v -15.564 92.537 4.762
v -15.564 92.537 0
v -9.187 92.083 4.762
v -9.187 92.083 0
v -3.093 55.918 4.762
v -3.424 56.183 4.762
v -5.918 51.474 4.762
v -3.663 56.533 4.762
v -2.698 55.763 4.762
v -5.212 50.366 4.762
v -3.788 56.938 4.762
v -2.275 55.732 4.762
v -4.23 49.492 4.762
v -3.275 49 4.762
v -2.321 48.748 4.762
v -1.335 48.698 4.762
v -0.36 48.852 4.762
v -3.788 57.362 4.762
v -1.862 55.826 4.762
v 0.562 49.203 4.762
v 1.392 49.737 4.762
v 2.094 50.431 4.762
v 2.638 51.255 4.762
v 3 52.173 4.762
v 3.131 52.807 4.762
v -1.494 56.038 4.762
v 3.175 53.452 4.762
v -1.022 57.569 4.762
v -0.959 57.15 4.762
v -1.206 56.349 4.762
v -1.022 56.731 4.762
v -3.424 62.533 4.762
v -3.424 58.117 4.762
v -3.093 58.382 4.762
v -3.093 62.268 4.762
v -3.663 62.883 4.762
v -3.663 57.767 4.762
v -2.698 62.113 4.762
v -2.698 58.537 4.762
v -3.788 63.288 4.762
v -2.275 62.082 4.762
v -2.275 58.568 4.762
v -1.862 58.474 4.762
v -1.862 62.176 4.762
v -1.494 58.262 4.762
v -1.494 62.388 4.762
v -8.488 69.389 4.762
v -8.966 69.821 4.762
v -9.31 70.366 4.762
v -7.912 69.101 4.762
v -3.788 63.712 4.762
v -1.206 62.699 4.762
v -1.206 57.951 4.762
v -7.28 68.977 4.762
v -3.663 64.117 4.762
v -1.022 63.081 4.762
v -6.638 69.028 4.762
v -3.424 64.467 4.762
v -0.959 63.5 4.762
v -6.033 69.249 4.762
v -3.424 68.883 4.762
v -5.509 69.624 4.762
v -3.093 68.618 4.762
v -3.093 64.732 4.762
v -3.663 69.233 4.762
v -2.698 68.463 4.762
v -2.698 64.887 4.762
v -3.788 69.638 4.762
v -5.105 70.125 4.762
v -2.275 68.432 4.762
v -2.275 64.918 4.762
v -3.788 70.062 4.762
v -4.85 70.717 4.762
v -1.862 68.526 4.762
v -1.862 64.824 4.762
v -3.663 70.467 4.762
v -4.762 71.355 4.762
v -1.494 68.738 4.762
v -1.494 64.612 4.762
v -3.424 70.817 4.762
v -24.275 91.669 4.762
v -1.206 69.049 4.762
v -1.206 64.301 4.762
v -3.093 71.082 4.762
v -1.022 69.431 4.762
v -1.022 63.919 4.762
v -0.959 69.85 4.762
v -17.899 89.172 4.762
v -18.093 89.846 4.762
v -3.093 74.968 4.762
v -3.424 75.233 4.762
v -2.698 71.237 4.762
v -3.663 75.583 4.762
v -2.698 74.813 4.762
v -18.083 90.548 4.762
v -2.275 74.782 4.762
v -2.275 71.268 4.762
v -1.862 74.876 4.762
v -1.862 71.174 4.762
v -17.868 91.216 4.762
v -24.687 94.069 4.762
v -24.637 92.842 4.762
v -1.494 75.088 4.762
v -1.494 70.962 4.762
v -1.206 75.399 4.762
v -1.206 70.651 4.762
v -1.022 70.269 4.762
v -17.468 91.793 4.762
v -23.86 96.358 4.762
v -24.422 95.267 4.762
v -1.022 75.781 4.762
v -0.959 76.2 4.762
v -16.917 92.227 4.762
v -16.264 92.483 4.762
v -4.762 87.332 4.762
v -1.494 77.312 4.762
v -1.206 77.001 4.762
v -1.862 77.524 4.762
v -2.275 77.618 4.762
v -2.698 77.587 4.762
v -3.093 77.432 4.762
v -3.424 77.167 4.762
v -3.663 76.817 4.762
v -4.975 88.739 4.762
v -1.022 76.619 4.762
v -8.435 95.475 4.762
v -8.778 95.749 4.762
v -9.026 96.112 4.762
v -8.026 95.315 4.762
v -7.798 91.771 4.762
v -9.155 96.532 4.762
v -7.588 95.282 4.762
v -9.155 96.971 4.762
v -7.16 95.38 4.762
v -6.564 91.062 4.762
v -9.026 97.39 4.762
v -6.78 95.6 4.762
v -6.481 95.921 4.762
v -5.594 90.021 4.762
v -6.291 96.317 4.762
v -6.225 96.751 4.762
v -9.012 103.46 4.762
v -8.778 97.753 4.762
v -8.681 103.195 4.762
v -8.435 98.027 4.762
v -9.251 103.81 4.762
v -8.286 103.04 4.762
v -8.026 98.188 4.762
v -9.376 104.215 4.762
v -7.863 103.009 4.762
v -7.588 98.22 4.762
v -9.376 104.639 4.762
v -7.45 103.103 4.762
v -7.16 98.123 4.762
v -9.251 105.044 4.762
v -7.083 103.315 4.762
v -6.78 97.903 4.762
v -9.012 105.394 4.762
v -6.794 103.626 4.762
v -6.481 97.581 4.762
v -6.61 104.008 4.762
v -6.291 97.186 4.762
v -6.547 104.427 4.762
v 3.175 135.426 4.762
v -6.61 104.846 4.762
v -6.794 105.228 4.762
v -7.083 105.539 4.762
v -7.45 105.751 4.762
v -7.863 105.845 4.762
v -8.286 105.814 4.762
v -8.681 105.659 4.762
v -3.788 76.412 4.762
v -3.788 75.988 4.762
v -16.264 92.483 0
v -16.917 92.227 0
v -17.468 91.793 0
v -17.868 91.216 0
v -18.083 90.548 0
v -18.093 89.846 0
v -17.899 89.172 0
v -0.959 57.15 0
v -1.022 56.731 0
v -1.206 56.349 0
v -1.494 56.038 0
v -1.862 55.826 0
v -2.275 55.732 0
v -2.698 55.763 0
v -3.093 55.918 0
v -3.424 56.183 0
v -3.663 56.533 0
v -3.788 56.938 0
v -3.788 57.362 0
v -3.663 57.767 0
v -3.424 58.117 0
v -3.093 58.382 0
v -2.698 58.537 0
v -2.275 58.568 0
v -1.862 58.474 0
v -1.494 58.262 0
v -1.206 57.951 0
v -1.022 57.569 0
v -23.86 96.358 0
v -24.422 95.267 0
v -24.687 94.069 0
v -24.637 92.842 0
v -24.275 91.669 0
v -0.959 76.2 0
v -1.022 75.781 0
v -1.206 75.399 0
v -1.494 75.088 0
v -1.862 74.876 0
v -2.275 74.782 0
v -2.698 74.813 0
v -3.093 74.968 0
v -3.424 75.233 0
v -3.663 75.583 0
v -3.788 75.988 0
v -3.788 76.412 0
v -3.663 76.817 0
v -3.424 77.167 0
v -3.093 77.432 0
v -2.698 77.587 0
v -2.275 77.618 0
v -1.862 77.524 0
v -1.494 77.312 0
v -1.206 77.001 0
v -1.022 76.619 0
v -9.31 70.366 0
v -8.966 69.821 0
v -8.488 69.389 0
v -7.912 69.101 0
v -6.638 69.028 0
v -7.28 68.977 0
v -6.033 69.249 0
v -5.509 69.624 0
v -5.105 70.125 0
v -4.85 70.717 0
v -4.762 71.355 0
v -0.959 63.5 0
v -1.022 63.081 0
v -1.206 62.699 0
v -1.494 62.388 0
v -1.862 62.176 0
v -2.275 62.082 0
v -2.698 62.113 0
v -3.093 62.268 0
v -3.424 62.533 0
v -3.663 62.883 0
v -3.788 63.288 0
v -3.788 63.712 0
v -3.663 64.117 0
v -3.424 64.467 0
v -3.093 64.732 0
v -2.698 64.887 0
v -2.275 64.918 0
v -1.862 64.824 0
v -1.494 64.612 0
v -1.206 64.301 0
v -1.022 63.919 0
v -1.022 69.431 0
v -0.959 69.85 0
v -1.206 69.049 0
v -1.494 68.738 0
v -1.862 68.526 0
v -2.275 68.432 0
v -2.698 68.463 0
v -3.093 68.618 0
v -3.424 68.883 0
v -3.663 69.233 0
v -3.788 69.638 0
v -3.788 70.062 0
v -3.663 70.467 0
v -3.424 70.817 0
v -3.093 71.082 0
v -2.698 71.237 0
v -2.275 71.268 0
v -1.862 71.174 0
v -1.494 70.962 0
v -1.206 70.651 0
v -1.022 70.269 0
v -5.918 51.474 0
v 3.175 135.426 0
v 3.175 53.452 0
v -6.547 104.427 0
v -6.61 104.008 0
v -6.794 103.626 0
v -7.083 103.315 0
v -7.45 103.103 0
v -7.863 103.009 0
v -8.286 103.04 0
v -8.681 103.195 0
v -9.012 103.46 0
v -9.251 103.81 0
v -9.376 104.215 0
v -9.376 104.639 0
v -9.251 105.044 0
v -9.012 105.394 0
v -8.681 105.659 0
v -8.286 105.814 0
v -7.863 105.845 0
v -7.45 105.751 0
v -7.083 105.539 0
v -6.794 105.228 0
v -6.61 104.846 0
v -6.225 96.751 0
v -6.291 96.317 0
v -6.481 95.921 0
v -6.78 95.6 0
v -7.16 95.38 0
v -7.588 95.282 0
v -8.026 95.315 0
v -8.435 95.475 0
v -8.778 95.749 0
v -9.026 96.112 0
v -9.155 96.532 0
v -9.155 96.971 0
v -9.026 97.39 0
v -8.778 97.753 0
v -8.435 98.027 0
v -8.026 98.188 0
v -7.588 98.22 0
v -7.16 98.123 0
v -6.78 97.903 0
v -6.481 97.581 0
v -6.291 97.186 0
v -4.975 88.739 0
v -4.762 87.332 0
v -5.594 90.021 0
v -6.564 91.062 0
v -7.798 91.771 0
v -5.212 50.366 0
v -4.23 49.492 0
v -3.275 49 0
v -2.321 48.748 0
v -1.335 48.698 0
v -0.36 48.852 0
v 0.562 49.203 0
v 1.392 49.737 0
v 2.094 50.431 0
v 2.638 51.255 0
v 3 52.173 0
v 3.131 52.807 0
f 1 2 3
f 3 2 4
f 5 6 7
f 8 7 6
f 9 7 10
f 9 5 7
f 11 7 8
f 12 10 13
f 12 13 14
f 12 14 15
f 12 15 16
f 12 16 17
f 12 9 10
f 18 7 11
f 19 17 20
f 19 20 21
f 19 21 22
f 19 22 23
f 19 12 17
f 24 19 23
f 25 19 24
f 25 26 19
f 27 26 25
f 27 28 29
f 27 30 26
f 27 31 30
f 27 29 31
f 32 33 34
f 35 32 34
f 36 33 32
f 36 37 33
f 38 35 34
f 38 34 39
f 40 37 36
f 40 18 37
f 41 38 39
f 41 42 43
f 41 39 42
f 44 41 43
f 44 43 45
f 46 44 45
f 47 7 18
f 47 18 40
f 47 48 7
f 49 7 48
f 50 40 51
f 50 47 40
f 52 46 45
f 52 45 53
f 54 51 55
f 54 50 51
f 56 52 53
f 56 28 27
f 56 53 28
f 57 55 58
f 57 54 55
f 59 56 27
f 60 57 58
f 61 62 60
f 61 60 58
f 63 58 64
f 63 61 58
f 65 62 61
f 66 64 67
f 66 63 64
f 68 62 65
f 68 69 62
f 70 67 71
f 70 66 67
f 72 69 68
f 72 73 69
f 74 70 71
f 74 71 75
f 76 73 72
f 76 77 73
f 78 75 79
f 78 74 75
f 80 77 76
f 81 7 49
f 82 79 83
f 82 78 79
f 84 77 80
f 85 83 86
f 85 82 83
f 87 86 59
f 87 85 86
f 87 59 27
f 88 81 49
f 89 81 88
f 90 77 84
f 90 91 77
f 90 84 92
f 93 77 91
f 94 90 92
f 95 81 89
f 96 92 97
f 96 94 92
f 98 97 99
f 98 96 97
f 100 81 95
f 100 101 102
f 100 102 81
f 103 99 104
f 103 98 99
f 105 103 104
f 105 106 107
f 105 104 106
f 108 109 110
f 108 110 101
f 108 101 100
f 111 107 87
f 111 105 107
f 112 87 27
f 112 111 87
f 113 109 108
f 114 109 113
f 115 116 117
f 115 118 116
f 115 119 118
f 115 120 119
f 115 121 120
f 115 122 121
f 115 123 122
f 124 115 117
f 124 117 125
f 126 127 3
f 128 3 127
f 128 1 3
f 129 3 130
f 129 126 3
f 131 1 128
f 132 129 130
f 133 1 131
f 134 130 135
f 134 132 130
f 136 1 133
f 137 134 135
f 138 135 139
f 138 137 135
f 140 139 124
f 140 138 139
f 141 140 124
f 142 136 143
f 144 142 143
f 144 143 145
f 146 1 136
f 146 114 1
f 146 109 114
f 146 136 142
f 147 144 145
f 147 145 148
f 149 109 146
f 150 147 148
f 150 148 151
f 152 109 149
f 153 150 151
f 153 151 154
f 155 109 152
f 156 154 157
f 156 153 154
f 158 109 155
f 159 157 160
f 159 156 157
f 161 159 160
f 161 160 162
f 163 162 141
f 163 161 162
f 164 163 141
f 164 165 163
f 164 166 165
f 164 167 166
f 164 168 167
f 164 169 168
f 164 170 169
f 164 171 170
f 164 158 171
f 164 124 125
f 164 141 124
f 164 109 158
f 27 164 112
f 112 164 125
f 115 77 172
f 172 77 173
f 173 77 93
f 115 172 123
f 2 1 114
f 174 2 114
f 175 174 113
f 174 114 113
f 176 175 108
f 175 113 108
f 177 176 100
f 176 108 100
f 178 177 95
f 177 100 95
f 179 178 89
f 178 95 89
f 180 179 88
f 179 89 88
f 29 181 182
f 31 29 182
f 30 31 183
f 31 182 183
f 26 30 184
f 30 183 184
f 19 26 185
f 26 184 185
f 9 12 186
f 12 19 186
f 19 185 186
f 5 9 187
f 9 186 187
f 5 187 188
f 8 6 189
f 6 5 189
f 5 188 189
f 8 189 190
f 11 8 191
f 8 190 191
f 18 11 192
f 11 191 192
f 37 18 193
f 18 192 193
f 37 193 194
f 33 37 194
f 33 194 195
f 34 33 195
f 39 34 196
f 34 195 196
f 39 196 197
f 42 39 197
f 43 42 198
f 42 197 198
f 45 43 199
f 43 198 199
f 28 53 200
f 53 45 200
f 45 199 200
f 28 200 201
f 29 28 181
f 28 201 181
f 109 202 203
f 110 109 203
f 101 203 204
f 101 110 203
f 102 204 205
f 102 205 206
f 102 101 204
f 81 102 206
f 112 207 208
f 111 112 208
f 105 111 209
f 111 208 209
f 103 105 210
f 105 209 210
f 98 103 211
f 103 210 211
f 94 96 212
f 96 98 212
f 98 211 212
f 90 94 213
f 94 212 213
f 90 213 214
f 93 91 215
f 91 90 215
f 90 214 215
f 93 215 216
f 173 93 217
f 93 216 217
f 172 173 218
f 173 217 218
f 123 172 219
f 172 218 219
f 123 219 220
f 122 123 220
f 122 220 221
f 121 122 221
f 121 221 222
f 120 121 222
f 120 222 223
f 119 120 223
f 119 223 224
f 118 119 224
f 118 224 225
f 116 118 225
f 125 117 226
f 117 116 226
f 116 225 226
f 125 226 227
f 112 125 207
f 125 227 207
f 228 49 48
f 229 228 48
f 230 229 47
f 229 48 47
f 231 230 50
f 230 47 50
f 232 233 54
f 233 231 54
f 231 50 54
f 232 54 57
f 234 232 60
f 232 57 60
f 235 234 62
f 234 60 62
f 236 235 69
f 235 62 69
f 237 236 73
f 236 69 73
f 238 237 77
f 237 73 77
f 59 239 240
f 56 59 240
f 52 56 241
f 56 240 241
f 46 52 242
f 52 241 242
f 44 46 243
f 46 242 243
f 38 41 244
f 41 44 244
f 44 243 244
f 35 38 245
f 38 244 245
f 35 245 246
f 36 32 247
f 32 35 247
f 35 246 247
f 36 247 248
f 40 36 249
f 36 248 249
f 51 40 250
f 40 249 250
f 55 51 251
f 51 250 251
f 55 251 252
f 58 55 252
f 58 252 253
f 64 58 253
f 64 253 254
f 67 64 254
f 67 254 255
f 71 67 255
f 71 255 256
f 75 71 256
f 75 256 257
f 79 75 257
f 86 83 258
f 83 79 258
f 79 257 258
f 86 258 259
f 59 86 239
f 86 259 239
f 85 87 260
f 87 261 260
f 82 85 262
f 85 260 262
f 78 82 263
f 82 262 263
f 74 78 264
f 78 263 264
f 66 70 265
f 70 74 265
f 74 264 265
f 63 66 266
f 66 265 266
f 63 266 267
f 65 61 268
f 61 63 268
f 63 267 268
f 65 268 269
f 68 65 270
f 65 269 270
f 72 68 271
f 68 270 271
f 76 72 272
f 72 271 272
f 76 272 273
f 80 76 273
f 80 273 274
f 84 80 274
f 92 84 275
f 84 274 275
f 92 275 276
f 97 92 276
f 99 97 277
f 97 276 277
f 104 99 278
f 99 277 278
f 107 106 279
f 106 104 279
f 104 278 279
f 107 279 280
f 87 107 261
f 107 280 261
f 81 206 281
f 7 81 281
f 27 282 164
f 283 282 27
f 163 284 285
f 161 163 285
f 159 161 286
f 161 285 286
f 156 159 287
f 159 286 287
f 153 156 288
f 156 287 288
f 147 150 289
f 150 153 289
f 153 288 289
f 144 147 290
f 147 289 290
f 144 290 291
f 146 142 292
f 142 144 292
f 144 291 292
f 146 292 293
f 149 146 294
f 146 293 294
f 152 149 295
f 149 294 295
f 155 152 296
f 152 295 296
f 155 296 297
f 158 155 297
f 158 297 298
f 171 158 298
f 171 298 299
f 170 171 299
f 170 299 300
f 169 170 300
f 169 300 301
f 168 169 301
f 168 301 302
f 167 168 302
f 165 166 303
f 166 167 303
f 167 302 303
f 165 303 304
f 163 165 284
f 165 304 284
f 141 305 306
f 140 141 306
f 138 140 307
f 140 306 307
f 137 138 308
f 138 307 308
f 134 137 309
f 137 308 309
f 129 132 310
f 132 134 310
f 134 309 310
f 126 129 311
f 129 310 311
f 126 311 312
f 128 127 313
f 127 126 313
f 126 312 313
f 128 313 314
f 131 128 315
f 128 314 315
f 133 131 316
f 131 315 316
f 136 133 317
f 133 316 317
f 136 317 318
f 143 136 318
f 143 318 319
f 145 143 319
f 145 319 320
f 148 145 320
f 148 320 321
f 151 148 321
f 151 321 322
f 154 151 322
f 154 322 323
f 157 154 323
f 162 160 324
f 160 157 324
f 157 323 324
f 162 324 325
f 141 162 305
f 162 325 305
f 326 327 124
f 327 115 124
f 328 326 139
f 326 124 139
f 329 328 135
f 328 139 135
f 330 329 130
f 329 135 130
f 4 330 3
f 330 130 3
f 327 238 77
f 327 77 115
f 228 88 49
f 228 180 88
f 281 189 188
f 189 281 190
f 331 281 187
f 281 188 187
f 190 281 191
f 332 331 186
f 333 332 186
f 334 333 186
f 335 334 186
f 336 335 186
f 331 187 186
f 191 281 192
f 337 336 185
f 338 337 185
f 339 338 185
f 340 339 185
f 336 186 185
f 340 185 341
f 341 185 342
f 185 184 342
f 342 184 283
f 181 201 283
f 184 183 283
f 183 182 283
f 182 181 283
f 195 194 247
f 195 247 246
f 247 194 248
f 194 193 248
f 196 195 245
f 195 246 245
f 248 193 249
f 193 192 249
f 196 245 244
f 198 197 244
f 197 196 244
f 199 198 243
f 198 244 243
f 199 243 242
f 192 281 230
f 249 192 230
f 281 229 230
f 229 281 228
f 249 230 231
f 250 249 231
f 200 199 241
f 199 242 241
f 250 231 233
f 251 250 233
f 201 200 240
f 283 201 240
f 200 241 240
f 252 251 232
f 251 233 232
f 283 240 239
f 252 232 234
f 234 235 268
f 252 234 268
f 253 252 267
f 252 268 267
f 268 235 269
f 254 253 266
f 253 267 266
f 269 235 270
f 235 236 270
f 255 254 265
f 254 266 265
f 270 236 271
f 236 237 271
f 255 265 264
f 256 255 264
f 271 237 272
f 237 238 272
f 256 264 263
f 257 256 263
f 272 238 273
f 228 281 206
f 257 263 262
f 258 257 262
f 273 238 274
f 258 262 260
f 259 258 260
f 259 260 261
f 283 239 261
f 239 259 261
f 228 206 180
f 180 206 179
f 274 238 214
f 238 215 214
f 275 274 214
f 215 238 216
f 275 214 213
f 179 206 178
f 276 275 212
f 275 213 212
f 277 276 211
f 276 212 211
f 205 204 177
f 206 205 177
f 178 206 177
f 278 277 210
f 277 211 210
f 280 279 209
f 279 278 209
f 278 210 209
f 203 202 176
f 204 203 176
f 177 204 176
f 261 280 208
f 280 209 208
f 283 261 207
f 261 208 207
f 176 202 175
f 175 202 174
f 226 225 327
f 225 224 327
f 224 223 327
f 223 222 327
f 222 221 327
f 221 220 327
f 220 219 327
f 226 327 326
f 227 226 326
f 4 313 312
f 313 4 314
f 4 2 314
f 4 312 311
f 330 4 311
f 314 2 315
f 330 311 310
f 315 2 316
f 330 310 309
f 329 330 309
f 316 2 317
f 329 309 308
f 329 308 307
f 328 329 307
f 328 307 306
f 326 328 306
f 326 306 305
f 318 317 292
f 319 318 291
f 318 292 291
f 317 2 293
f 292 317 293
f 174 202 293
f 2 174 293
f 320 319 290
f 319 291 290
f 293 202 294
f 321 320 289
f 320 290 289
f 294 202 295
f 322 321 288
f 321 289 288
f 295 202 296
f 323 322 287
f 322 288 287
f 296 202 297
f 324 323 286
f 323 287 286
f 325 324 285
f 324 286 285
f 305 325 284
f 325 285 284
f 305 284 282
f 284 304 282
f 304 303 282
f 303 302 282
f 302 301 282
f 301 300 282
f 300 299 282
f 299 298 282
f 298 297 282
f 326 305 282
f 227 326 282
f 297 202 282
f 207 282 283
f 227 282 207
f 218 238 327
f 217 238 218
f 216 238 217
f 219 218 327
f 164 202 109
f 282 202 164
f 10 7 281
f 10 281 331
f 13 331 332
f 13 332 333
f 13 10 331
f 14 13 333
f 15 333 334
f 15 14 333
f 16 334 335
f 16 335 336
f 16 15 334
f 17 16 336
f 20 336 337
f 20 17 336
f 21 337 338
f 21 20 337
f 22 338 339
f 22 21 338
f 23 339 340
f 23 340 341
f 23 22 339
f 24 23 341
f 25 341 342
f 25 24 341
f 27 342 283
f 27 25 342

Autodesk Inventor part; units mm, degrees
ref_plane "YZ Plane" through (0, 0, 0) normal (1, 0, 0) x (0, 1, 0)
ref_plane "XZ Plane" through (0, 0, 0) normal (0, 1, 0) x (-1, 0, 0)
ref_plane "XY Plane" through (0, 0, 0) normal (0, 0, 1) x (1, 0, 0)
sketch "Sketch1" plane through (0, 0, 0) normal (0, 0, 1) x (1, 0, 0)
  line L0 (0, 0) -> (0, 137.0131)
  line L1 (-11.7886, 12.2907) -> (-39.6863, 18.4755) construction
  line L2 (-39.6863, 18.4755) -> (-33.3297, 47.1481) construction
  line L3 (-33.3297, 47.1481) -> (-5.432, 40.9633) construction
  line L4 (-5.432, 40.9633) -> (-11.7886, 12.2907) construction
  line L5 (-39.6863, 18.4755) -> (-5.432, 40.9633) construction
  line L6 (-33.3297, 47.1481) -> (-11.7886, 12.2907) construction
  circle A0 centre (-53.975, 12.7) radius 3.175
  circle A1 centre (-53.975, 12.7) radius 9.525
  line L7 (0, 0) -> (-54.5315, 3.1913) construction
  line L8 (-62.4238, 17.0982) -> (0, 137.0131) construction
  line L9 (-27.1302, 45.7737) -> (-37.4529, 28.5497) construction
  line L10 (-11.6315, 42.3377) -> (-9.5552, 22.3649) construction
  line L11 (-19.3809, 44.0557) -> (-25.7374, 15.3831) construction
  line L12 (0, 104.775) -> (-15.0457, 108.1106) construction
  line L13 (-35.3766, 8.5768) -> (-19.8779, 5.1408) construction
  line L14 (-19.8779, 5.1408) -> (-21.2523, -1.0586) construction
  line L15 (-21.2523, -1.0586) -> (-36.751, 2.3773) construction
  line L16 (-36.751, 2.3773) -> (-35.3766, 8.5768) construction
  line L17 (-35.3766, 8.5768) -> (-44.7305, 2.6177) construction
  line L18 (-19.8779, 5.1408) -> (-17.2457, 1.0092) construction
  line L19 (-5.432, 40.9633) -> (-33.3297, 47.1481) construction
  line L20 (-33.3297, 47.1481) -> (-32.2475, 52.0296) construction
  line L21 (-32.2475, 52.0296) -> (-4.3498, 45.8448) construction
  line L22 (-4.3498, 45.8448) -> (-5.432, 40.9633) construction
  line L23 (-53.2878, 15.7997) -> (-53.975, 12.7) construction
  line L24 (-53.975, 12.7) -> (-57.0747, 13.3872) construction
  line L25 (-27.6272, 6.8588) -> (-34.4992, -24.1386) construction
  line L26 (-31.8676, 50.076) -> (-5.5198, 44.2349) construction
  line L27 (-5.5198, 44.2349) -> (-4.489, 48.8845) construction
  line L28 (-4.489, 48.8845) -> (-30.8368, 54.7256) construction
  line L29 (-30.8368, 54.7256) -> (-31.8676, 50.076) construction
  line L30 (-31.3522, 52.4008) -> (-5.0044, 46.5597) construction
  circle A2 centre (-29.0274, 51.8854) radius 1.4732 construction
  circle A3 centre (-22.8279, 50.5111) radius 1.4732 construction
  circle A4 centre (-16.6284, 49.1367) radius 1.4732
  circle A5 centre (-10.4289, 47.7623) radius 1.4732
  circle A6 centre (-7.6985, 96.7513) radius 1.4732
  line L31 (-53.975, 12.7) -> (-5.4185, 105.9762) construction
  line L32 (-31.2085, 56.4341) -> (0, 49.5153) construction
  circle A7 centre (-7.6985, 96.7513) radius 4.7625 construction
  line L33 (-4.7625, 48.9451) -> (-4.7625, 105.8308)
  line L34 (-26.3948, 55.3669) -> (-7.323, 92.0036) construction
  line L35 (-3.5958, 94.3328) -> (-4.7625, 94.5914) construction
  line L36 (-17.2457, 1.0092) -> (0, 1.0092) construction
  line L37 (0, 1.0092) -> (0, -2.1658) construction
  line L38 (0, -2.1658) -> (-17.2457, -2.1658) construction
  line L39 (-17.2457, -2.1658) -> (-17.2457, 1.0092) construction
  circle A8 centre (-12.7, 7.9375) radius 1.5875 construction
  line L40 (-12.7, 7.9375) -> (0, 7.9375) construction
  line L41 (0, 7.9375) -> (-17.2457, 1.0092)
  circle A9 centre (-12.7, 7.9375) radius 3.175 construction
  line L42 (-9.525, 7.9375) -> (-9.525, 4.111) construction
  line L43 (-9.525, 7.9375) -> (0, 7.9375) construction
  line L44 (-17.9187, 46.9837) -> (-16.8879, 51.6333) construction
  line L45 (-12.4942, 45.7811) -> (-26.2381, -16.2137) construction
  line L46 (0, 53.6985) -> (0, 7.9375) construction
  line L47 (-26.2381, -16.2137) -> (-20.0386, -17.5881) construction
  line L48 (-20.0386, -17.5881) -> (-8.7313, 7.9375)
  circle A10 centre (-12.7, 6.35) radius 1.4224
  line L49 (0, 13.4938) -> (-4.7625, 13.4938) construction
  line L50 (-4.7625, 13.4938) -> (-4.7625, 24.6063) construction
  line L51 (-4.7625, 24.6063) -> (0, 24.6063) construction
  line L52 (0, 24.6063) -> (0, 13.4938) construction
  line L53 (-4.7625, 19.05) -> (0, 19.05) construction
  circle A11 centre (-2.3813, 19.05) radius 1.4224
  line L54 (-20.7405, 8.5842) -> (-9.7454, 58.18) construction
  line L55 (-9.7454, 58.18) -> (-3.5459, 56.8056) construction
  line L56 (-3.5459, 56.8056) -> (-14.5411, 7.2098) construction
  line L57 (-14.5411, 7.2098) -> (-20.7405, 8.5842) construction
  line L58 (-12.7, 6.35) -> (-12.7, 7.9375) construction
  line L59 (-11.5442, 1.5875) -> (-9.525, 1.5875) construction
  line L60 (-9.525, 1.5875) -> (-9.525, 7.9375) construction
  line L61 (-9.525, 7.9375) -> (-11.5442, 7.9375) construction
  line L62 (-11.5442, 7.9375) -> (-11.5442, 1.5875) construction
  line L63 (-9.7454, 58.18) -> (-15.9449, 59.5544) construction
  line L64 (-18.8691, 53.6985) -> (0, 53.6985) construction
  line L65 (-9.7454, 58.18) -> (-17.3193, 53.3549) construction
  arc A12 (-10.2313, 55.9882) -> (-11.9373, 58.6659) centre (-11.0843, 57.3271) ccw construction
  line L66 (-4.7625, 57.15) -> (0, 57.15) construction
  circle A13 centre (-2.3813, 57.15) radius 1.4224
  circle A14 centre (-2.3813, 63.5) radius 1.4224
  line L67 (0, 7.9375) -> (-45.2378, 7.9375) construction
  line L68 (-45.2378, 7.9375) -> (-45.2378, -28.575) construction
  line L69 (-45.2378, -28.575) -> (0, -28.575)
  line L70 (0, -28.575) -> (0, 7.9375)
  line L71 (-45.2378, -28.575) -> (-62.6076, 8.6746)
  line L72 (-60.0032, 20.0747) -> (-18.8691, 53.6985) construction
  line L73 (-20.0386, -17.5881) -> (-20.0386, -28.575) construction
  line L74 (-20.2435, 47.4991) -> (-19.2127, 52.1487) construction
  line L75 (-12.7, -28.575) -> (-12.7, -1.0217)
  circle A15 centre (-23.8125, -19.05) radius 1.7526
  circle A16 centre (-15.875, -14.2875) radius 1.7526
  circle A17 centre (-23.8125, -19.05) radius 3.175 construction
  circle A18 centre (-2.3813, 69.85) radius 1.4224
  circle A19 centre (-2.3813, 76.2) radius 1.4224
  circle A20 centre (-15.875, -14.2875) radius 3.175 construction
  circle A21 centre (-46.0375, -19.05) radius 1.7526
  arc A22 (0, 104.775) -> (-15.0457, 108.1106) centre (-7.9697, 104.427) ccw construction
  circle A23 centre (-7.9697, 104.427) radius 1.4224
  line L76 (-7.9697, 104.427) -> (-15.0457, 108.1106) construction
  line L77 (-7.9697, 104.427) -> (0, 104.775) construction
  line L78 (0, 43.0112) -> (-20.2435, 47.4991)
  line L79 (-20.2435, 47.4991) -> (-25.4, 94.1319)
  line L80 (-25.4, 94.1319) -> (3.175, 135.4256)
  line L81 (0, 122.468) -> (-20.4707, 92.8859)
  line L82 (-20.4707, 92.8859) -> (-15.8846, 51.4108)
  line L83 (-15.8846, 51.4108) -> (0, 47.8893)
  line L84 (-20.4707, 92.8859) -> (-4.7625, 91.7678)
  line L85 (3.175, 135.4256) -> (3.175, 47.8893)
  line L86 (3.175, 47.8893) -> (0, 47.8893)
  line L87 (-25.4, 94.1319) -> (-4.7625, 48.9451)
  line L88 (-19.9433, 93.648) -> (-4.7625, 60.4089)
  point P0 (-22.5591, 29.7194)
  point P1 (-20.7484, 1.2142)
  point P2 (-36.3367, 4.2458)
  point P3 (-49.5768, 21.1488)
  point P4 (-11.1125, 7.9375)
  point P5 (-11.4283, 6.9872)
  point P6 (-11.9574, 7.9375)
  point P7 (-13.9717, 6.9872)
  point P8 (-9.525, 6.1457)
  point P9 (-10.6215, 3.6705)
  point P10 (0, 130.8374)
  point P11 (-19.5658, 92.8214)
  dimension "d74" = 6.35
  dimension "d14" = 29.3687
  dimension "d15" = 28.575
  dimension "d16" = 12.5
  dimension "d17" = 6.35
  dimension "d19" = 53.975
  dimension "d22" = 19.05
  dimension "d23" = 7.9375
  dimension "d24" = 19.05
  dimension "d26" = 102.5
  dimension "d29" = 6.35
  dimension "d31" = 7.9375
  dimension "d34" = 5
  dimension "d35" = 26.9875
  dimension "d38" = 31.75
  dimension "d40" = 26.9875
  dimension "d41" = 4.7625
  dimension "d42" = 2.9464
  dimension "d43" = 2.3813
  dimension "d46" = 6.35
  dimension "d51" = 2.9464
  dimension "d52" = 92.075
  dimension "d53" = 6.35
  dimension "d54" = 9.525
  dimension "d55" = 4.7625
  dimension "d56" = 4.7625
  dimension "d60" = 12.7
  dimension "d61" = 3.175
  dimension "d63" = 3.175
  dimension "d66" = 3.175
  dimension "d67" = 12.7
  dimension "d72" = 8.7312
  dimension "d73" = 7.9375
  dimension "d80" = 12.7
  dimension "d82" = 7.9375
  dimension "d83" = 63.5
  dimension "d85" = 6.35
  dimension "d86" = 104.775
  dimension "d87" = 2.8448
  dimension "d88" = 4.7625
  dimension "d89" = 11.1125
  dimension "d90" = 2.8448
  dimension "d91" = 19.05
  dimension "d92" = 6.35
  dimension "d93" = 50.8
  dimension "d94" = 25.4
  dimension "d95" = 8.7312
  dimension "d96" = 9.525
  dimension "d97" = 6.35
  dimension "d99" = 6.35
  dimension "d101" = 3.175
  dimension "d106" = 2.8448
  dimension "d107" = 57.15
  dimension "d110" = 6.35
  dimension "d136" = 3.175
  dimension "d138" = 28.575
  dimension "d139" = 12.7
  dimension "d140" = 3.5052
  dimension "d141" = 3.5052
  dimension "d142" = 9.525
  dimension "d143" = 3.175
  dimension "d144" = 11.1125
  dimension "d145" = 6.35
  dimension "d146" = 14.2875
  dimension "d149" = 6.35
extrude "Extrusion1" add sketch "Sketch1" along normal blind 4.7625 contours L83 L33 L84 L88 L81 L0 | L0 L80 L85 L86 | L81 L82 L87 L80 L0 | L87 L82 L84 L88 L33 | L88 L84 L81
fillet "Fillet7" radius 4.7625 5 edges at (-4.7625, 91.7678, 2.3813) (-25.4, 94.1319, 2.3813) (-4.7625, 48.9451, 2.3813) (0, 47.8893, 2.3813) (3.175, 47.8893, 2.3813)
fillet "Fillet8" radius 2.3813 2 edges at (-19.5658, 92.8214, 2.3813) (-4.7625, 60.4089, 2.3813)
equation "\"d56\" = d55"
properties part number "Uprights" material "Steel, Alloy"
